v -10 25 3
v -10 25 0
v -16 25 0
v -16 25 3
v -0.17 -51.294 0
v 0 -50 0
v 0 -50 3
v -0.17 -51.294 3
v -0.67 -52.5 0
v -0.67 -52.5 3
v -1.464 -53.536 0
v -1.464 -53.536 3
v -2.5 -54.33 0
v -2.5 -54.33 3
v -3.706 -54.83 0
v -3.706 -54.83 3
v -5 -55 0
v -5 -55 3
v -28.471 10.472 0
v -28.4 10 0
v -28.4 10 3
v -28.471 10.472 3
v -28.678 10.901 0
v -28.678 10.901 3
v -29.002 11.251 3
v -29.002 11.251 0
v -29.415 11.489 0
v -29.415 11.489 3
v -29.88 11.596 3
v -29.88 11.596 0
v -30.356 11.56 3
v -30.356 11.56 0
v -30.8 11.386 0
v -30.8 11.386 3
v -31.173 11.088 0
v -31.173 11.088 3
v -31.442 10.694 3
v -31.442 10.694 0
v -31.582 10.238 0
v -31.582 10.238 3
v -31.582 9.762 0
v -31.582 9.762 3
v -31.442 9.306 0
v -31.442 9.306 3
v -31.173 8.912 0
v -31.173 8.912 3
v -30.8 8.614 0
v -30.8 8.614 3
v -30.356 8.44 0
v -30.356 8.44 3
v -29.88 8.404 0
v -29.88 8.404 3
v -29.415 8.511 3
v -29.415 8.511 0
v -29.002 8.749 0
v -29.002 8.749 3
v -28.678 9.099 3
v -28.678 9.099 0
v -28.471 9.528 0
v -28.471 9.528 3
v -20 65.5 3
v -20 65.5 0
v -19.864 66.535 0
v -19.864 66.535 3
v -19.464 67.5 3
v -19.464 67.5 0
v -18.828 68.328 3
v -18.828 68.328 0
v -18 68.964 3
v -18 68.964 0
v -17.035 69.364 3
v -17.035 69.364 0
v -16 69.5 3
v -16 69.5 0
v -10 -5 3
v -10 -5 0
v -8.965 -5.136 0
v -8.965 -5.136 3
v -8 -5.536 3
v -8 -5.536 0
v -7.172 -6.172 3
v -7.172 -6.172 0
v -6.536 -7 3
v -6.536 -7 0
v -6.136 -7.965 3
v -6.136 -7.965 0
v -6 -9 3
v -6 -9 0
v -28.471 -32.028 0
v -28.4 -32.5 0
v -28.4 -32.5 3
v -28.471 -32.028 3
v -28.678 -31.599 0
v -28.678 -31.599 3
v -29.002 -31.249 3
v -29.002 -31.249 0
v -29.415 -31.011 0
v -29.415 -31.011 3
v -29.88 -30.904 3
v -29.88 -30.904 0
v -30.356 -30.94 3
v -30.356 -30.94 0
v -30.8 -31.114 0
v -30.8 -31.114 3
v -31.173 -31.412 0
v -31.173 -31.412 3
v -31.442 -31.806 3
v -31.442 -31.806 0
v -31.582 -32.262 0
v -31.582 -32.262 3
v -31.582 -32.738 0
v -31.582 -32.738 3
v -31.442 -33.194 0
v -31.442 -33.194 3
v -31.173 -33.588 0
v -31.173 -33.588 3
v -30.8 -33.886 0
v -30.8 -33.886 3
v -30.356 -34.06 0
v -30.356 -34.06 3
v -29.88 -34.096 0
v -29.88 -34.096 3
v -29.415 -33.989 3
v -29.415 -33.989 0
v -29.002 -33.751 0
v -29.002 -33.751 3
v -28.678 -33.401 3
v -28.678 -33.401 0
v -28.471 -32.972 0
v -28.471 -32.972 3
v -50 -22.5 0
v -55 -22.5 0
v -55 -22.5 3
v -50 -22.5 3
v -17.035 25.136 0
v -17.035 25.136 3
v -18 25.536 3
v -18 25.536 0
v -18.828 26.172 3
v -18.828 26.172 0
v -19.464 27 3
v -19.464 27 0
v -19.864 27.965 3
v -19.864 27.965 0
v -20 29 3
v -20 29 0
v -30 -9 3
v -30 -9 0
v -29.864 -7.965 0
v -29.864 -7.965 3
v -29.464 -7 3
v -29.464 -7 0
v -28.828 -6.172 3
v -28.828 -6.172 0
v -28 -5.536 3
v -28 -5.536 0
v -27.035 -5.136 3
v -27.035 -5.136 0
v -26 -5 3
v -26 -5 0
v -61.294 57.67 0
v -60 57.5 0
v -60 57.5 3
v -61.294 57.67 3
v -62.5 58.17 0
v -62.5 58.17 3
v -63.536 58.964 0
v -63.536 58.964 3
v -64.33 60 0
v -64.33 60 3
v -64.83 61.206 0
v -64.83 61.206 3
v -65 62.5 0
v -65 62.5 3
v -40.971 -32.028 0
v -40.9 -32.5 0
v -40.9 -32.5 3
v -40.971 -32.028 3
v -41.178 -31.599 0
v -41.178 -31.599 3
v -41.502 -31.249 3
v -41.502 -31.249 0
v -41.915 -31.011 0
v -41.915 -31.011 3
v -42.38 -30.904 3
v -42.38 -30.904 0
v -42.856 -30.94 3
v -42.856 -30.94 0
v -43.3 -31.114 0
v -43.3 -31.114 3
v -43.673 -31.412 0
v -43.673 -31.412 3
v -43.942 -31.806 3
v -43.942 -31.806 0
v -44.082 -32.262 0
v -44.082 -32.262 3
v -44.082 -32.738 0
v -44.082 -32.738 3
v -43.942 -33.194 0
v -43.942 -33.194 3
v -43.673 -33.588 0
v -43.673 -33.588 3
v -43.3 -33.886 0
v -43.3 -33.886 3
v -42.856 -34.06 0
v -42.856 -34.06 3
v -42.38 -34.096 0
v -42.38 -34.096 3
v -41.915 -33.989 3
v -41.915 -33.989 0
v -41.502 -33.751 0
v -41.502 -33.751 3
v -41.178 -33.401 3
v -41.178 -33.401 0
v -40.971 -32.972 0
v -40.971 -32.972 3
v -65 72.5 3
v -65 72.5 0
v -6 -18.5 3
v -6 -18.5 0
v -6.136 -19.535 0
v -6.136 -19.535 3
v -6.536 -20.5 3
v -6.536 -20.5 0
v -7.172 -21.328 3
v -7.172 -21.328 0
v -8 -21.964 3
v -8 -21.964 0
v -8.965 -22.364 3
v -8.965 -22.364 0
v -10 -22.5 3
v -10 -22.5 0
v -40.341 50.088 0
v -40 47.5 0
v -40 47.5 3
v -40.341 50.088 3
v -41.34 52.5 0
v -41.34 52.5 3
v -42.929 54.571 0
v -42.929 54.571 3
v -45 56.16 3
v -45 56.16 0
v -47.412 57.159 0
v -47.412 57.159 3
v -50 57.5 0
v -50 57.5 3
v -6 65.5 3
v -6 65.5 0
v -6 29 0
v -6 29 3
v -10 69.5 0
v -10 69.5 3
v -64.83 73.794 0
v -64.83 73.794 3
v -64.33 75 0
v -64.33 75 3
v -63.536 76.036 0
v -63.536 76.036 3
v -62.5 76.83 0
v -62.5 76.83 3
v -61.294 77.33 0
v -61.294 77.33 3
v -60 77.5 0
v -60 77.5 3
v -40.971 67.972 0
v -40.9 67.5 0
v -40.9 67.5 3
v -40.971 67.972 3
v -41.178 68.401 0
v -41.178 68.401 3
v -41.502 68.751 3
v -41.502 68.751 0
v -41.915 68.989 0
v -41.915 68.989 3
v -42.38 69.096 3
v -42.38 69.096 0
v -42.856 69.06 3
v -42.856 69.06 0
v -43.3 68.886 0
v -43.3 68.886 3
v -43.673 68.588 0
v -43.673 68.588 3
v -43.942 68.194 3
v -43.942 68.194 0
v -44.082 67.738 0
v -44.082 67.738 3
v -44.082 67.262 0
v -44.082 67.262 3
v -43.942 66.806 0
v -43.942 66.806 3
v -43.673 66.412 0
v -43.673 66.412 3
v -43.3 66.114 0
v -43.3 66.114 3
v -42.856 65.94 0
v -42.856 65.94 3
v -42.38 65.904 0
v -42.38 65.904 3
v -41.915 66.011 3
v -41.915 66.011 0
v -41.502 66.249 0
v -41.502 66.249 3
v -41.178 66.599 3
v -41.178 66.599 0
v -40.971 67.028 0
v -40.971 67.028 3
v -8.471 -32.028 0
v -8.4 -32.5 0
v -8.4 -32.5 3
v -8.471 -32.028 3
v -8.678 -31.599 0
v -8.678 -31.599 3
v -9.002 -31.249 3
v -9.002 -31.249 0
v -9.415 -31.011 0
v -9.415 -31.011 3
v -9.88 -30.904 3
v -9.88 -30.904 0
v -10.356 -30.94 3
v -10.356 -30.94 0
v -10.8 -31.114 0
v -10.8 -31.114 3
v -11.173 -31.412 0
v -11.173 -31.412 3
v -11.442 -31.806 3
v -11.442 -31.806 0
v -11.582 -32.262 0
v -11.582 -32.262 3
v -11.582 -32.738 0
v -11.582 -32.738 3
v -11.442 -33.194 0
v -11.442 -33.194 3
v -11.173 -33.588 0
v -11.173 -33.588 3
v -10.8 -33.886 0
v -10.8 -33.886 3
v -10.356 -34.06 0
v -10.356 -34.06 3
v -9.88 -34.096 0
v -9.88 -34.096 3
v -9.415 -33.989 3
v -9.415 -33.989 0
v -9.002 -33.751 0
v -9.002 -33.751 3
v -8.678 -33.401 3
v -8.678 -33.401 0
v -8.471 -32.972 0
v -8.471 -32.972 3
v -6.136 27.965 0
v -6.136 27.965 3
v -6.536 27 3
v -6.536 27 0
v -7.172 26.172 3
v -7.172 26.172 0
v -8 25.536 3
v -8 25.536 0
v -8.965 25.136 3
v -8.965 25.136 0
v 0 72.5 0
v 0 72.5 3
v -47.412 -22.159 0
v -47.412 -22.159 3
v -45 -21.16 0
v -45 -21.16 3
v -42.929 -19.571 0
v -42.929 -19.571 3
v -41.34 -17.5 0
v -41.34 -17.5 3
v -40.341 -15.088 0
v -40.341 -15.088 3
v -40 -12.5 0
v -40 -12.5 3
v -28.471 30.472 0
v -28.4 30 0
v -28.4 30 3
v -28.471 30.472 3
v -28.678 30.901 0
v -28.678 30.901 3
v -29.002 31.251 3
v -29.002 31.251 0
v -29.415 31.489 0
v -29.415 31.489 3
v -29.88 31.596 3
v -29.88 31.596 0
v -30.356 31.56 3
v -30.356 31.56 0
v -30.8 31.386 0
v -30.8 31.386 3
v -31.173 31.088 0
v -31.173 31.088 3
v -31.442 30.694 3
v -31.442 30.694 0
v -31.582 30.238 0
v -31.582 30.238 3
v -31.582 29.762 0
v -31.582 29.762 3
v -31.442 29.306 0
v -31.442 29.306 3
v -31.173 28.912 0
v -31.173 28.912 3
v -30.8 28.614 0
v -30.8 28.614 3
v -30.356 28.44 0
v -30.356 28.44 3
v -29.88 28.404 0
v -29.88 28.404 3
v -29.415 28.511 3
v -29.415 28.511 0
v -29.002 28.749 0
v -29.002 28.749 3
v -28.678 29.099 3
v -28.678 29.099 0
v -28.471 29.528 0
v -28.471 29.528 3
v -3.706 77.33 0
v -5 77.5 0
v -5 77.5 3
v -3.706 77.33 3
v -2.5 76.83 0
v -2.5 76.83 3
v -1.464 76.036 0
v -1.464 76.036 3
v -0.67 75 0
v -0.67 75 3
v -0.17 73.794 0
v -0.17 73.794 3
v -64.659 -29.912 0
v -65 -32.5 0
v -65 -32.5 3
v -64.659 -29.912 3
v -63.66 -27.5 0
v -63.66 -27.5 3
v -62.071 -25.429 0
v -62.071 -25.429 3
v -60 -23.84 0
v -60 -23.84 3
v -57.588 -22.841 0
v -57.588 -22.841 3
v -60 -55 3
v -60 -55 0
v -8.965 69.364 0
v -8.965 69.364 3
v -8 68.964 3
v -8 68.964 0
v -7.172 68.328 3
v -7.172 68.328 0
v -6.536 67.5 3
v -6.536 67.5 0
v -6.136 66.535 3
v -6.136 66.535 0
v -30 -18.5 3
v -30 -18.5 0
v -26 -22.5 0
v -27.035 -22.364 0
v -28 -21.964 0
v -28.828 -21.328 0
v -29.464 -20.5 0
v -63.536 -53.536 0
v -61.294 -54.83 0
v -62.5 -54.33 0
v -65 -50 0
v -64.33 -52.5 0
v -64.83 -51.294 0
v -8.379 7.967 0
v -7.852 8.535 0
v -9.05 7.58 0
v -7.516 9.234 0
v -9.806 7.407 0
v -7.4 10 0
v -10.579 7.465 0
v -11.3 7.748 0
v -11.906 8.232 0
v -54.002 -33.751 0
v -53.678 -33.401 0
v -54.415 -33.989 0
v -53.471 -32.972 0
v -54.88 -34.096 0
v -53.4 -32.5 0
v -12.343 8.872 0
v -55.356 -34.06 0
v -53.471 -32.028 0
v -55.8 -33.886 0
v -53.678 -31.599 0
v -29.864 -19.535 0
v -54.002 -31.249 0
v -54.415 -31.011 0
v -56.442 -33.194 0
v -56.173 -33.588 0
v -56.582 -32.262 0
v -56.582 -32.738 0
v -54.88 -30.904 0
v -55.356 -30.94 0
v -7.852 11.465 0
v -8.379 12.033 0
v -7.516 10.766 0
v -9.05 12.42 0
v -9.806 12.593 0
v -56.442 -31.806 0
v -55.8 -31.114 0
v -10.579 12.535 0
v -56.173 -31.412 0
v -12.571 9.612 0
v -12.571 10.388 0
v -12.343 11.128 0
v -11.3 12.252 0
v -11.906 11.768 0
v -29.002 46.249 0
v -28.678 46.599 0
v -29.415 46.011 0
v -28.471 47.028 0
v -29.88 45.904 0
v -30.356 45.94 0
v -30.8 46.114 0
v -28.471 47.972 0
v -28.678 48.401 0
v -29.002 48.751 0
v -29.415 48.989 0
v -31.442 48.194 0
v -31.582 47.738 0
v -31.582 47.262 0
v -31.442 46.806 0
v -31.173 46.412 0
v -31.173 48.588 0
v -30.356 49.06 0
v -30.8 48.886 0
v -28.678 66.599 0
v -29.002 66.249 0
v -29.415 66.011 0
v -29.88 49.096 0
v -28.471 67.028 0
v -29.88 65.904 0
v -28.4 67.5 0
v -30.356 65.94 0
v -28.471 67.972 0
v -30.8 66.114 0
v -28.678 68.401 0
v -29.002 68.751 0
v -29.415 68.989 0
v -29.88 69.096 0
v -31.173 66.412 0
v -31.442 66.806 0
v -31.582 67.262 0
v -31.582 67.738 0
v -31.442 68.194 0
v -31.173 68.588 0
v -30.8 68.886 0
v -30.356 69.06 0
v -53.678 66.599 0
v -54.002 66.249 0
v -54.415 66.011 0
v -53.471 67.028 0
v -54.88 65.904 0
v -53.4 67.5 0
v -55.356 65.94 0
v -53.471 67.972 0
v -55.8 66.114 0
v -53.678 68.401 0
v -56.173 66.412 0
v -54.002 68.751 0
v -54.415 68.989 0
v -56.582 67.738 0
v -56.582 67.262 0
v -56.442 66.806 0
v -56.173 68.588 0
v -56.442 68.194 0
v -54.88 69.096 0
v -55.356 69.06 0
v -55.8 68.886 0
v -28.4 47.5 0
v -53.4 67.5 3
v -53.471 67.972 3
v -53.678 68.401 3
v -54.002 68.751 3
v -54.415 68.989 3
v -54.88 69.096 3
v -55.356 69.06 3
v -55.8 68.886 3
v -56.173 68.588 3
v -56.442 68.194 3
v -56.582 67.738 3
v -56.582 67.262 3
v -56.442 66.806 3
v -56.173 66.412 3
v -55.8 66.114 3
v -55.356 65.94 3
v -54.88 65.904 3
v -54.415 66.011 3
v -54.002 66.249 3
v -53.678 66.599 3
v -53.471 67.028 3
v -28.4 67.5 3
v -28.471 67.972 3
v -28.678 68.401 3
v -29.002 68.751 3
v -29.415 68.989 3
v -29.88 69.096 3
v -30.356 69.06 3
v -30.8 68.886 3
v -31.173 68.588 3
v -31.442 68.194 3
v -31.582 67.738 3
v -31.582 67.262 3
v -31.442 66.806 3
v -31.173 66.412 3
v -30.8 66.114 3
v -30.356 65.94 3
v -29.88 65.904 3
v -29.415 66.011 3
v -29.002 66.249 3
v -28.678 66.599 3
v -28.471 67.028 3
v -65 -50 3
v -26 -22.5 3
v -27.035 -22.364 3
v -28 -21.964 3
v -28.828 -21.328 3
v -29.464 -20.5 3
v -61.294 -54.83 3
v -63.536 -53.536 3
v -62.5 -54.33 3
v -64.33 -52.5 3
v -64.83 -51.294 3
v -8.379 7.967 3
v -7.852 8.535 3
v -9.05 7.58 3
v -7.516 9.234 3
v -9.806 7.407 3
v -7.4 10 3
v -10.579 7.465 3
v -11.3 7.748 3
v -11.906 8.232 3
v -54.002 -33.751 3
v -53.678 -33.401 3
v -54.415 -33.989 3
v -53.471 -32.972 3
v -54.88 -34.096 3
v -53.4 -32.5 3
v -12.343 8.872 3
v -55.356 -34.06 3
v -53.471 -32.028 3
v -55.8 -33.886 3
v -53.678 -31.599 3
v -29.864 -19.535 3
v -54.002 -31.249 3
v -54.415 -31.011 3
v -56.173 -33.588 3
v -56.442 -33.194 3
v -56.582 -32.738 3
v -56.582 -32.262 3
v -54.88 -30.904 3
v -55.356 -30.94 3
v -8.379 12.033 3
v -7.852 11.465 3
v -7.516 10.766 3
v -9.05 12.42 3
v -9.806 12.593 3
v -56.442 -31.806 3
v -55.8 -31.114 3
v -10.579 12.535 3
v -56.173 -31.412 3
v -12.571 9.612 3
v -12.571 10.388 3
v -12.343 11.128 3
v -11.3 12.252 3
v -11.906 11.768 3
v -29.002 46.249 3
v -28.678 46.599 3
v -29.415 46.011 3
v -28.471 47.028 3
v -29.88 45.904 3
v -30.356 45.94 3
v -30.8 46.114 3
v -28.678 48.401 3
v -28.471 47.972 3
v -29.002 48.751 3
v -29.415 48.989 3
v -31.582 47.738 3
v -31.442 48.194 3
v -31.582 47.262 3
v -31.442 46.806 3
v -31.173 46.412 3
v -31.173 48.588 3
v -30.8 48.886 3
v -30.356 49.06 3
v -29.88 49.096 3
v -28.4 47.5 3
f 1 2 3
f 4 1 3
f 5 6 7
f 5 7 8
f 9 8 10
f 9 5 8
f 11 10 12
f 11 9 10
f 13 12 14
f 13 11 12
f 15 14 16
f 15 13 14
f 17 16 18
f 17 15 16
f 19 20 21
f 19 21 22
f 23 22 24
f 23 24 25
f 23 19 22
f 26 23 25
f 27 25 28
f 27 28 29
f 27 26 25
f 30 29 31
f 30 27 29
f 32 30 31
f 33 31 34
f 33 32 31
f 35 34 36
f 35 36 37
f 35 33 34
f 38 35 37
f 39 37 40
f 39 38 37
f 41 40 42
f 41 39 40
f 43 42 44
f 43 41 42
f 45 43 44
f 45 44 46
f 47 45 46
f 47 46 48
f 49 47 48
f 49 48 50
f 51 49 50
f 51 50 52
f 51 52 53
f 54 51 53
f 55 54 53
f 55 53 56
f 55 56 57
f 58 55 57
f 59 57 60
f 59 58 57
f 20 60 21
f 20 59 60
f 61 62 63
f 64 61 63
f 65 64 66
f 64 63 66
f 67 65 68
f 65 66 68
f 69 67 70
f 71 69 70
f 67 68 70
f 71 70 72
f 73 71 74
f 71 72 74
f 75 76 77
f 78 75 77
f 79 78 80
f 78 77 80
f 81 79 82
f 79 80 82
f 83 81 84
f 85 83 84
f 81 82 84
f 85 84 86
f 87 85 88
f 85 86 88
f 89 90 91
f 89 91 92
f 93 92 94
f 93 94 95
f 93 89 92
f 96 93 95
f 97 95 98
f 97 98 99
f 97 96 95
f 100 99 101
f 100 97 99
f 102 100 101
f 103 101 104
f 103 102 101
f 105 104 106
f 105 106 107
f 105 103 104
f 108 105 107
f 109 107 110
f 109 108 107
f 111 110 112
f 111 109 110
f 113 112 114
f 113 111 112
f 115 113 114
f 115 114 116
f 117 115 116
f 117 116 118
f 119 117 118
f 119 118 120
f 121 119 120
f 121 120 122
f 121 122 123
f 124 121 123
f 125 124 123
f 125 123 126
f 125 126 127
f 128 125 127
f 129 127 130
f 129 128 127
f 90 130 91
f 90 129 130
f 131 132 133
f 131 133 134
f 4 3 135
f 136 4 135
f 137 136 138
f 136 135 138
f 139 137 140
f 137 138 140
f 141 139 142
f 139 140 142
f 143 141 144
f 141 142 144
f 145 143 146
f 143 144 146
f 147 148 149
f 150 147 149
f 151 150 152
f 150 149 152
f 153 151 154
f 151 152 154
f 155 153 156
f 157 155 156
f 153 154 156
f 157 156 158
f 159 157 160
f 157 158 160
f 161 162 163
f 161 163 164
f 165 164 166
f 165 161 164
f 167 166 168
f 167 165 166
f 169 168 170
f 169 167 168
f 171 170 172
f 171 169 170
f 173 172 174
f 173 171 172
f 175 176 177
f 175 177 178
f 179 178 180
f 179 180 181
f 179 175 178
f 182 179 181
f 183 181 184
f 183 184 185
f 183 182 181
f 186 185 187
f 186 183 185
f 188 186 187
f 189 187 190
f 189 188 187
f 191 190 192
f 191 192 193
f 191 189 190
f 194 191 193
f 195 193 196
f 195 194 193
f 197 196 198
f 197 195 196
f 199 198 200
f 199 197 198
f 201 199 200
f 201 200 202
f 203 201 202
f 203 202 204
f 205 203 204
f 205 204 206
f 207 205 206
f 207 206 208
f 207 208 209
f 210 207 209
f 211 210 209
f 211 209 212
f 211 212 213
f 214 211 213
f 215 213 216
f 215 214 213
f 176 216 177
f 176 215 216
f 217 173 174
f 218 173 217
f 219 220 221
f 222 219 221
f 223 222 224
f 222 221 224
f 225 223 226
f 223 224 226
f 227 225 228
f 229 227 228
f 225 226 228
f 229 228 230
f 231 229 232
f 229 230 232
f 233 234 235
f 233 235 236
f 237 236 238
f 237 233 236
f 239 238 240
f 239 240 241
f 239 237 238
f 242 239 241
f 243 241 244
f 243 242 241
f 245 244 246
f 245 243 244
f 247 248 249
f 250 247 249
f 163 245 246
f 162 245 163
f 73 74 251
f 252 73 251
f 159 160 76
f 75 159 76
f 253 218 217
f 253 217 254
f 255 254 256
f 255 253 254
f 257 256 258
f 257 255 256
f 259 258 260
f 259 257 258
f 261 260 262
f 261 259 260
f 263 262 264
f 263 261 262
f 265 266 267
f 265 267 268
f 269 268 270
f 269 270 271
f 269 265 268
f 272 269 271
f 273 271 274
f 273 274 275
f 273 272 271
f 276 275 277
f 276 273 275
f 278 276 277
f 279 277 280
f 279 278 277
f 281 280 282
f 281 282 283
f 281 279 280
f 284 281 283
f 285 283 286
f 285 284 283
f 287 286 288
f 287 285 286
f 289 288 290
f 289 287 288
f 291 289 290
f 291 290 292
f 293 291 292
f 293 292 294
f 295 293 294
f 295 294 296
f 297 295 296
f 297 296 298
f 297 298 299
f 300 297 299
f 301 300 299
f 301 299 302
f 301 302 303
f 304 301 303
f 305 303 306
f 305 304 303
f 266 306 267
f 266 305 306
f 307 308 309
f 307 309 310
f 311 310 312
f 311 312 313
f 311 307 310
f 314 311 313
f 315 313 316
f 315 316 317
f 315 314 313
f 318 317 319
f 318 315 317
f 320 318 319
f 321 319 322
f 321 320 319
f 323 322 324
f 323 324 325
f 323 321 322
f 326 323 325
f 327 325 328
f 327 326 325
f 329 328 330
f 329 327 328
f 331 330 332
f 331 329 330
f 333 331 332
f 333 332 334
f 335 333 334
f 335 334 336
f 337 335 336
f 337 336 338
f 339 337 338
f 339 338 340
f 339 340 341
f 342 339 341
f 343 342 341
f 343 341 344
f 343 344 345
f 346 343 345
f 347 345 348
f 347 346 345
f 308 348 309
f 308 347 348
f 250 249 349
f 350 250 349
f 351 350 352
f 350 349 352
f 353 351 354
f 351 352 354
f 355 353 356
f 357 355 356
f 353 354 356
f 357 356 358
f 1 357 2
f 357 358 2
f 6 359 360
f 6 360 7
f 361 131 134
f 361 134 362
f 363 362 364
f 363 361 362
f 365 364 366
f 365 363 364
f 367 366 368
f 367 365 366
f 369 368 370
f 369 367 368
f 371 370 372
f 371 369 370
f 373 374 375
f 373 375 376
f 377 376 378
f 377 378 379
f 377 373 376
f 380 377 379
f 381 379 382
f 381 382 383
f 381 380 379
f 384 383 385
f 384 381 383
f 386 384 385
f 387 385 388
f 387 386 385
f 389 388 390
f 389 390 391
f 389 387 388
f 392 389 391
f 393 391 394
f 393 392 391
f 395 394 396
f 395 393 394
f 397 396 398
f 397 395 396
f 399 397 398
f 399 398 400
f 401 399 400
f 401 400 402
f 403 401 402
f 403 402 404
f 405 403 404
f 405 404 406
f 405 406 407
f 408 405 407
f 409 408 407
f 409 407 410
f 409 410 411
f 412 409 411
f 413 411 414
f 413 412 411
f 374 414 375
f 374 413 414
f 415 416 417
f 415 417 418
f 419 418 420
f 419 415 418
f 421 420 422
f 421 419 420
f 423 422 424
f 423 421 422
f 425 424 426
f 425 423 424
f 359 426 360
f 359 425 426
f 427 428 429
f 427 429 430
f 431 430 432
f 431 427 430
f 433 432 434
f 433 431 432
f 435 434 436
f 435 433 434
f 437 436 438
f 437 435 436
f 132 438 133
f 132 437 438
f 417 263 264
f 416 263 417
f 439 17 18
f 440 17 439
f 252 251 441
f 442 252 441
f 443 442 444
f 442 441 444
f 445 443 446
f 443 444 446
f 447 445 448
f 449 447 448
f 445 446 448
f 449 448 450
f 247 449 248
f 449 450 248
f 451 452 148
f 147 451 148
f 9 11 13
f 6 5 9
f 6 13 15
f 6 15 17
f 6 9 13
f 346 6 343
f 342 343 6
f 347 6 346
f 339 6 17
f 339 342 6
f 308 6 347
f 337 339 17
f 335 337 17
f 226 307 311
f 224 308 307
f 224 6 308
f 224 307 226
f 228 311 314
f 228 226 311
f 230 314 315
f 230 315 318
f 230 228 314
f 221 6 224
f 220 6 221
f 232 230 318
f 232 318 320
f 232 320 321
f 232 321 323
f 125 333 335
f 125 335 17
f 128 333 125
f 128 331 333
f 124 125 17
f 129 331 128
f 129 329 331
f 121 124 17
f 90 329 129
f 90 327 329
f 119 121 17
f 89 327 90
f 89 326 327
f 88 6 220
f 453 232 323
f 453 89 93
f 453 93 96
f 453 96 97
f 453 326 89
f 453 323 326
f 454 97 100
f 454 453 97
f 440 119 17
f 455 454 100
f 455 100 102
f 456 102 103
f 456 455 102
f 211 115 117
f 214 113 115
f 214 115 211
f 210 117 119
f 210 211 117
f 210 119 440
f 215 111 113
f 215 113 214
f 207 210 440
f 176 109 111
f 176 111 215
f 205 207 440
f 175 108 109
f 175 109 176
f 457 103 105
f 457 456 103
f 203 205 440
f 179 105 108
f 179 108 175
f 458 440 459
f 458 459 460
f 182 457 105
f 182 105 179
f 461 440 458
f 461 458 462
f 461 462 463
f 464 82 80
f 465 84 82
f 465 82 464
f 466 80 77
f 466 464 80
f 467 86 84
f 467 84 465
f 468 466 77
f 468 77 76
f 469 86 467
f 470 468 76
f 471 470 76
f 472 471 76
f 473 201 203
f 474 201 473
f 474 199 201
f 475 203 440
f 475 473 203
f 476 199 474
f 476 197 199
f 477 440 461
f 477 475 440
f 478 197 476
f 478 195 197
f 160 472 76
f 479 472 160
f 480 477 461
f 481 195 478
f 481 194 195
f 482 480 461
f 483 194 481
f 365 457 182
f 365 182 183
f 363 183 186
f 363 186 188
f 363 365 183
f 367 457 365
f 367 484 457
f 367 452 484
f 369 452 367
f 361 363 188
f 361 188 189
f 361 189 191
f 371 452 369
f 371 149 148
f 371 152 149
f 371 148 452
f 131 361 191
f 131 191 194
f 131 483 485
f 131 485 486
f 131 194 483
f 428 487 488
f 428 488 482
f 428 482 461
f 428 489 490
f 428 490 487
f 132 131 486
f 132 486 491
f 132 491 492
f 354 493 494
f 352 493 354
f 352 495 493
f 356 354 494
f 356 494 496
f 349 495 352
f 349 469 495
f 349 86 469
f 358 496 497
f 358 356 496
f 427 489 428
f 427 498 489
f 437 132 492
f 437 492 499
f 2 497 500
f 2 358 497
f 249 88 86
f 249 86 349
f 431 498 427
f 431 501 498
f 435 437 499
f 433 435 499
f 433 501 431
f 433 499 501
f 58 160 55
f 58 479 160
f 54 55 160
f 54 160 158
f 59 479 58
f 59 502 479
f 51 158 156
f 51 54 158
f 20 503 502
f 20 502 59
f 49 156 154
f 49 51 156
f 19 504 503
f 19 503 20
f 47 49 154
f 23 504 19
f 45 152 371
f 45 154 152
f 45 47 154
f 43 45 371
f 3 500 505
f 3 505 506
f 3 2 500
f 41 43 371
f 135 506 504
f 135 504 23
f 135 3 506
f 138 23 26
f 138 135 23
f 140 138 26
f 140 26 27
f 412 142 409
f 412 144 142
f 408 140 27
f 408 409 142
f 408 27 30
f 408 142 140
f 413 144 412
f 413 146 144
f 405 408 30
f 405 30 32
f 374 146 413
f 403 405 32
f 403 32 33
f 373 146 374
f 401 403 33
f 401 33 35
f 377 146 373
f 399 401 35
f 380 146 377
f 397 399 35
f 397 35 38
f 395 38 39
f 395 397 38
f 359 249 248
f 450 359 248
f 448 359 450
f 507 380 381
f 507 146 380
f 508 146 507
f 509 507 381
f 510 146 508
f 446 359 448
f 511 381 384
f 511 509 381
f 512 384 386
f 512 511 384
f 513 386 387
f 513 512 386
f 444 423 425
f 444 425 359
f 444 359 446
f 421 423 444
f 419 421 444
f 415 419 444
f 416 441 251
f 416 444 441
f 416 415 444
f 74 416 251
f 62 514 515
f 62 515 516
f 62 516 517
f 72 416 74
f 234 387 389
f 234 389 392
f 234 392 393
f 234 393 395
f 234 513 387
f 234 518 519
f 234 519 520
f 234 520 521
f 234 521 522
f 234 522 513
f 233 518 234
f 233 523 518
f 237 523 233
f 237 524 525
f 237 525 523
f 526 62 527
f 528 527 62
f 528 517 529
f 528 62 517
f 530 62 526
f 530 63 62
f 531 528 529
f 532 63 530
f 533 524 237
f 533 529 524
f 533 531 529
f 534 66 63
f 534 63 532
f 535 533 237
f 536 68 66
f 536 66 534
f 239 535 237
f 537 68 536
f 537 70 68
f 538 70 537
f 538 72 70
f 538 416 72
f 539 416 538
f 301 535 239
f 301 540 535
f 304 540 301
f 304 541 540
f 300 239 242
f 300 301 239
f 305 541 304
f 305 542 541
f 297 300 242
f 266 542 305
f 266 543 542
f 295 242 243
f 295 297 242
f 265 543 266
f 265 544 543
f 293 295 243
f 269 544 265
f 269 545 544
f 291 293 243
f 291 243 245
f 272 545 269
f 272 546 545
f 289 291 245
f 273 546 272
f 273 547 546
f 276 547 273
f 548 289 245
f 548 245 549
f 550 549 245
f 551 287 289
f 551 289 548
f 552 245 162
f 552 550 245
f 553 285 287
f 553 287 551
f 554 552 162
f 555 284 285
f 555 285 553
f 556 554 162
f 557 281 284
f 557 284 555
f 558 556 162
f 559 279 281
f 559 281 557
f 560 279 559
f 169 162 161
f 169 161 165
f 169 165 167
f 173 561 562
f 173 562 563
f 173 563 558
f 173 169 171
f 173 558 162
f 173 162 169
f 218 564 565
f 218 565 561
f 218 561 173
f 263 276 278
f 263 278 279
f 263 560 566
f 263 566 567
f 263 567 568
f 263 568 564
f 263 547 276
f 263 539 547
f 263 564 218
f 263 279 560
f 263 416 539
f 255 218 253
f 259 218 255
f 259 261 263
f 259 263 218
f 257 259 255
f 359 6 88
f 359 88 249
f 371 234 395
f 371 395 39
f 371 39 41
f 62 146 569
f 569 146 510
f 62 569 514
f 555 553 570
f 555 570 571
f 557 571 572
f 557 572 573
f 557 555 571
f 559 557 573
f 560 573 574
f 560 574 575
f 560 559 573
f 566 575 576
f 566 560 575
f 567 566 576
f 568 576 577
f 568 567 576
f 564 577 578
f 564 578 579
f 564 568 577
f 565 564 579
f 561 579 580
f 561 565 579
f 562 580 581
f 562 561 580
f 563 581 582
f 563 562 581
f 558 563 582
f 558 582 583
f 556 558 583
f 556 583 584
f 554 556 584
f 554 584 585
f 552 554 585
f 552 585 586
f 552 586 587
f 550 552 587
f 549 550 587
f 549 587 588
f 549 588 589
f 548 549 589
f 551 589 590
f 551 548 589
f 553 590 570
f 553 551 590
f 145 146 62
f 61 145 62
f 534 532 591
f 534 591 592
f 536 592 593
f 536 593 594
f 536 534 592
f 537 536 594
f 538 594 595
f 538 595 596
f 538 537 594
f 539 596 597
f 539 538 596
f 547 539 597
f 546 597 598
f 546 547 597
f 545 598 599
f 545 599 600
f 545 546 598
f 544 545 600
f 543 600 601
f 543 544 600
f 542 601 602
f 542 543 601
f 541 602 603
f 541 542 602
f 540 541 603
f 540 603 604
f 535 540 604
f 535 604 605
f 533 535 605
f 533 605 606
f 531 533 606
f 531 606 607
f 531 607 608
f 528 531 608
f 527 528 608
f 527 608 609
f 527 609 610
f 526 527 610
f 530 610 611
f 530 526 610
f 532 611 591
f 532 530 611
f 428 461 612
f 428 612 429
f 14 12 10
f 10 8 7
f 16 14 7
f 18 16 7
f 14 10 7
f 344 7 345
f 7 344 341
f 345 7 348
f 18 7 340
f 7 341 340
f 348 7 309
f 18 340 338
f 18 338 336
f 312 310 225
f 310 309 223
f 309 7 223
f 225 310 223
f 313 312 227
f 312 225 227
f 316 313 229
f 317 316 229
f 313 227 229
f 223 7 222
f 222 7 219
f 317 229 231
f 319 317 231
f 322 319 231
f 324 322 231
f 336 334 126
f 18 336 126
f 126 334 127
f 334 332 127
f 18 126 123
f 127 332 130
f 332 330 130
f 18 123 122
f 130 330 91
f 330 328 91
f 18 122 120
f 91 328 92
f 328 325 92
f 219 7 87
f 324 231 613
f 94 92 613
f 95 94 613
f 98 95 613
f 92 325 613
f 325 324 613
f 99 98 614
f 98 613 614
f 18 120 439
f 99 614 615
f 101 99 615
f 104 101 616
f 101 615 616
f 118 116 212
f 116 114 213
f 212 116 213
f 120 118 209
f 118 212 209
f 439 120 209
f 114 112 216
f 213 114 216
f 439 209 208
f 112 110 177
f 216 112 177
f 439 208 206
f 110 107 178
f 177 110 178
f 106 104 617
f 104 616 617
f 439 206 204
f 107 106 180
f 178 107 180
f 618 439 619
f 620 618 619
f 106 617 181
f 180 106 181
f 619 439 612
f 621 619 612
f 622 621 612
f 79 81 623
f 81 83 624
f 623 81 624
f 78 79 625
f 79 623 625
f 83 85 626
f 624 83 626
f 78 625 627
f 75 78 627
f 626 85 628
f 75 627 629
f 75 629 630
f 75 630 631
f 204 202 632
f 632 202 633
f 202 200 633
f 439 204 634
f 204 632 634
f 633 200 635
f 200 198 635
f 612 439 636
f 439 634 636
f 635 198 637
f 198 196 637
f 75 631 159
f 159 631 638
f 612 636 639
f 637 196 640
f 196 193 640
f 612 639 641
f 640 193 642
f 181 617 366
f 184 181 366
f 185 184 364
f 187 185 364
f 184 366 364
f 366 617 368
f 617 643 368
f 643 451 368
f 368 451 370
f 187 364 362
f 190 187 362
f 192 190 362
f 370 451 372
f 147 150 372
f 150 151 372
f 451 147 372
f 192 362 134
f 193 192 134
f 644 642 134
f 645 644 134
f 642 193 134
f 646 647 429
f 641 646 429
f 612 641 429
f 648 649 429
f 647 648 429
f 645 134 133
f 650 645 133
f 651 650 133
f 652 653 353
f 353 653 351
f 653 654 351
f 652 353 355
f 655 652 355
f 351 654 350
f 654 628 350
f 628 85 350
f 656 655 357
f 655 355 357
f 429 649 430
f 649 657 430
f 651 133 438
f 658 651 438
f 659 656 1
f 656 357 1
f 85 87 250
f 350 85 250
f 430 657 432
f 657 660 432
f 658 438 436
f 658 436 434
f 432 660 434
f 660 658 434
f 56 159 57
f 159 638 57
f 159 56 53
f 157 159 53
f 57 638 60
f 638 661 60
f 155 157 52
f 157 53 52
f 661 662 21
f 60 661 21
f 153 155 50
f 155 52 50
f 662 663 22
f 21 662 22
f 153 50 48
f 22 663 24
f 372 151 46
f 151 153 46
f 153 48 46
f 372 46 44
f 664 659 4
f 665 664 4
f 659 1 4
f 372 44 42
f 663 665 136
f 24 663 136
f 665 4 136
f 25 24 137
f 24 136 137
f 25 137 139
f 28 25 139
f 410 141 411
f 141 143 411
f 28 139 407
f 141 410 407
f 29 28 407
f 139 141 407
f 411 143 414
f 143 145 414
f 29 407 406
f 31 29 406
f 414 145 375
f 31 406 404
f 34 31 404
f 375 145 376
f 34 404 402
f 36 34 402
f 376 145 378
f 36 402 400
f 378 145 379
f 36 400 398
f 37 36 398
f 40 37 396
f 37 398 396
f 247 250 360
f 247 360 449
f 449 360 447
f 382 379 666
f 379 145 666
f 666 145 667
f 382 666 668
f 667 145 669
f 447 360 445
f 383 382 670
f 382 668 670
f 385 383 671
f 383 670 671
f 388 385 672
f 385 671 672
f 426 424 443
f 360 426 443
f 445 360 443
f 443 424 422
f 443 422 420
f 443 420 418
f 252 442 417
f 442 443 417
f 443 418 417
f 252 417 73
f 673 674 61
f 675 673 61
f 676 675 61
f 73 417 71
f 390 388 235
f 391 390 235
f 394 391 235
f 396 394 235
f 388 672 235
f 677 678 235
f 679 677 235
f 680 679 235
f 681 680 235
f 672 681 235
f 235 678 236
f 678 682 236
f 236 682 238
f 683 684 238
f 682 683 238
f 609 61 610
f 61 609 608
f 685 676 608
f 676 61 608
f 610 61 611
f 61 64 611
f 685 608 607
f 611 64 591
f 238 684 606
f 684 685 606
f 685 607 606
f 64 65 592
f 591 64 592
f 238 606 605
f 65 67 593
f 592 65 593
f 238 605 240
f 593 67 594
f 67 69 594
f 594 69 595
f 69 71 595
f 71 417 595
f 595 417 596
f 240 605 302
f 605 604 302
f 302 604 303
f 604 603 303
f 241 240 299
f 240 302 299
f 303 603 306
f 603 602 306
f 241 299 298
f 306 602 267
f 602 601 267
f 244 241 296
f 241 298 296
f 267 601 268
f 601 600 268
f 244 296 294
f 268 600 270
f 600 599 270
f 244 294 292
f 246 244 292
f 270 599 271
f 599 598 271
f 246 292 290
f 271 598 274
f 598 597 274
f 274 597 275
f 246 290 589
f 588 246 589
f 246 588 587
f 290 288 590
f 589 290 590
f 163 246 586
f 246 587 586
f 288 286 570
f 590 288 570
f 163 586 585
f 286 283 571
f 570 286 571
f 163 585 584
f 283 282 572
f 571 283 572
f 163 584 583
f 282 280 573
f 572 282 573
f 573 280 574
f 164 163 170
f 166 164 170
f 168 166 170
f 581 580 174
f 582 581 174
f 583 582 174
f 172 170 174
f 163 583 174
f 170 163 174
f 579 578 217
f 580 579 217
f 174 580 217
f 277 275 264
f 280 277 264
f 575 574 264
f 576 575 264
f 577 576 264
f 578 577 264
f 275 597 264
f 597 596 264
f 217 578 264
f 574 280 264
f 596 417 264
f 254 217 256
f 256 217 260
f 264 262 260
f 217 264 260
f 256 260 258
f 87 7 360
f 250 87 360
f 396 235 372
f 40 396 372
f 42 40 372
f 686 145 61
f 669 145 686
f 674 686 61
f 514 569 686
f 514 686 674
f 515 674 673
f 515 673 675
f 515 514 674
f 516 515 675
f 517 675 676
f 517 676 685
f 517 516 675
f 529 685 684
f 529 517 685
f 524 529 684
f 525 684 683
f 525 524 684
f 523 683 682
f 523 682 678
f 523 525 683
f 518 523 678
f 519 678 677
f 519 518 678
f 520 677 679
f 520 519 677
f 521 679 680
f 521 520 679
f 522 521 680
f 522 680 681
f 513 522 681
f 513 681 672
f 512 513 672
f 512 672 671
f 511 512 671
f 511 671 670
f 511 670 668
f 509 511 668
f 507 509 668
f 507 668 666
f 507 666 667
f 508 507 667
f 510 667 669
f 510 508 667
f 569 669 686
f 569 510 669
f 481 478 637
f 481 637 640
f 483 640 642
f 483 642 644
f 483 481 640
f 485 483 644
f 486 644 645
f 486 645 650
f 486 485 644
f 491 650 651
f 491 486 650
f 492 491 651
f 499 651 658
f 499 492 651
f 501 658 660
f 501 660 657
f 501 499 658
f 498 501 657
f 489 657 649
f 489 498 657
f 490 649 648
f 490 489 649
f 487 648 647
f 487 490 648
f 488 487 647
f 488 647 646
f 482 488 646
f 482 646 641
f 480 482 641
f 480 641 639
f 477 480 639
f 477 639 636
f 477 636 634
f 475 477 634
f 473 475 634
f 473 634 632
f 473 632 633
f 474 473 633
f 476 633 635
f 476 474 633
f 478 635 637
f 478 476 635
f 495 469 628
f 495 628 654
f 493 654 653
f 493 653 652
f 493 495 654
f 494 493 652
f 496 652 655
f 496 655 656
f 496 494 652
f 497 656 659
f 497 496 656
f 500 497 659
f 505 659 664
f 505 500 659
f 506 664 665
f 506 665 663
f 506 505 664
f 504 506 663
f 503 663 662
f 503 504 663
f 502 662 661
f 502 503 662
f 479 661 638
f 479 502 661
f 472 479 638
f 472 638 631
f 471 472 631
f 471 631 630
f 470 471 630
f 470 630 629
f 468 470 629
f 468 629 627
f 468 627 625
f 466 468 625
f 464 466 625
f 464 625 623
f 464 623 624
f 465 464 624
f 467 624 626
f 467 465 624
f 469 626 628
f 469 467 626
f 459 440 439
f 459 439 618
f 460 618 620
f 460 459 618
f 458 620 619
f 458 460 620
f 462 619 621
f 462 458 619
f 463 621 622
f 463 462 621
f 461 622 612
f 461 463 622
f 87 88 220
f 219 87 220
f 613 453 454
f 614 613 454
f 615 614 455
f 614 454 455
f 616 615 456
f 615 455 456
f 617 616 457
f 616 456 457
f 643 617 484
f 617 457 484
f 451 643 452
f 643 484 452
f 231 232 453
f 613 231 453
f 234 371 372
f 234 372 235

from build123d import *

# Parameters (mm, degrees)
SKETCH_1_R      = 2.6
SKETCH_1_R_2    = 1.6
EXTRUDE_1_DEPTH = 3


with BuildPart() as part:
    # 草图1 → 凸台-拉伸1 (new body)
    with BuildSketch(Plane.XY):
        with BuildLine():
            Line((-60, 77.5), (-5, 77.5))
            ThreePointArc((-5, 77.5), (-1.464466094, 76.035533906), (0, 72.5))
            Line((0, 72.5), (0, -50))
            ThreePointArc((0, -50), (-1.464466094, -53.535533906), (-5, -55))
            Line((-5, -55), (-60, -55))
            ThreePointArc((-60, -55), (-63.535533906, -53.535533906), (-65, -50))
            Line((-65, -50), (-65, -32.5))
            ThreePointArc((-65, -32.5), (-62.071067812, -25.428932188), (-55, -22.5))
            Line((-55, -22.5), (-50, -22.5))
            ThreePointArc((-50, -22.5), (-42.928932188, -19.571067812), (-40, -12.5))
            Line((-40, -12.5), (-40, 47.5))
            ThreePointArc((-40, 47.5), (-42.928932188, 54.571067812), (-50, 57.5))
            Line((-50, 57.5), (-60, 57.5))
            ThreePointArc((-60, 57.5), (-63.535533906, 58.964466094), (-65, 62.5))
            Line((-65, 62.5), (-65, 72.5))
            ThreePointArc((-65, 72.5), (-63.535533906, 76.035533906), (-60, 77.5))
        make_face()
        with Locations((-10, 10)):
            Circle(SKETCH_1_R, mode=Mode.SUBTRACT)
        with Locations((-55, 67.5)):
            Circle(SKETCH_1_R_2, mode=Mode.SUBTRACT)
        with Locations((-30, 10)):
            Circle(SKETCH_1_R_2, mode=Mode.SUBTRACT)
        with Locations((-30, 67.5)):
            Circle(SKETCH_1_R_2, mode=Mode.SUBTRACT)
        with Locations((-42.5, 67.5)):
            Circle(SKETCH_1_R_2, mode=Mode.SUBTRACT)
        with Locations((-30, 47.5)):
            Circle(SKETCH_1_R_2, mode=Mode.SUBTRACT)
        with Locations((-30, 30)):
            Circle(SKETCH_1_R_2, mode=Mode.SUBTRACT)
        with Locations((-55, -32.5)):
            Circle(SKETCH_1_R_2, mode=Mode.SUBTRACT)
        with Locations((-42.5, -32.5)):
            Circle(SKETCH_1_R_2, mode=Mode.SUBTRACT)
        with Locations((-30, -32.5)):
            Circle(SKETCH_1_R_2, mode=Mode.SUBTRACT)
        with Locations((-10, -32.5)):
            Circle(SKETCH_1_R_2, mode=Mode.SUBTRACT)
        with BuildLine():
            Line((-26, -5), (-10, -5))
            ThreePointArc((-10, -5), (-7.171572875, -6.171572875), (-6, -9))
            Line((-6, -9), (-6, -18.5))
            ThreePointArc((-6, -18.5), (-7.171572875, -21.328427125), (-10, -22.5))
            Line((-10, -22.5), (-26, -22.5))
            ThreePointArc((-26, -22.5), (-28.828427125, -21.328427125), (-30, -18.5))
            Line((-30, -18.5), (-30, -9))
            ThreePointArc((-30, -9), (-28.828427125, -6.171572875), (-26, -5))
        make_face(mode=Mode.SUBTRACT)
        with BuildLine():
            Line((-10, 25), (-16, 25))
            ThreePointArc((-16, 25), (-18.828427125, 26.171572875), (-20, 29))
            Line((-20, 29), (-20, 65.5))
            ThreePointArc((-20, 65.5), (-18.828427125, 68.328427125), (-16, 69.5))
            Line((-16, 69.5), (-10, 69.5))
            ThreePointArc((-10, 69.5), (-7.171572875, 68.328427125), (-6, 65.5))
            Line((-6, 65.5), (-6, 29))
            ThreePointArc((-6, 29), (-7.171572875, 26.171572875), (-10, 25))
        make_face(mode=Mode.SUBTRACT)
    extrude(amount=EXTRUDE_1_DEPTH)


solid = part.part
